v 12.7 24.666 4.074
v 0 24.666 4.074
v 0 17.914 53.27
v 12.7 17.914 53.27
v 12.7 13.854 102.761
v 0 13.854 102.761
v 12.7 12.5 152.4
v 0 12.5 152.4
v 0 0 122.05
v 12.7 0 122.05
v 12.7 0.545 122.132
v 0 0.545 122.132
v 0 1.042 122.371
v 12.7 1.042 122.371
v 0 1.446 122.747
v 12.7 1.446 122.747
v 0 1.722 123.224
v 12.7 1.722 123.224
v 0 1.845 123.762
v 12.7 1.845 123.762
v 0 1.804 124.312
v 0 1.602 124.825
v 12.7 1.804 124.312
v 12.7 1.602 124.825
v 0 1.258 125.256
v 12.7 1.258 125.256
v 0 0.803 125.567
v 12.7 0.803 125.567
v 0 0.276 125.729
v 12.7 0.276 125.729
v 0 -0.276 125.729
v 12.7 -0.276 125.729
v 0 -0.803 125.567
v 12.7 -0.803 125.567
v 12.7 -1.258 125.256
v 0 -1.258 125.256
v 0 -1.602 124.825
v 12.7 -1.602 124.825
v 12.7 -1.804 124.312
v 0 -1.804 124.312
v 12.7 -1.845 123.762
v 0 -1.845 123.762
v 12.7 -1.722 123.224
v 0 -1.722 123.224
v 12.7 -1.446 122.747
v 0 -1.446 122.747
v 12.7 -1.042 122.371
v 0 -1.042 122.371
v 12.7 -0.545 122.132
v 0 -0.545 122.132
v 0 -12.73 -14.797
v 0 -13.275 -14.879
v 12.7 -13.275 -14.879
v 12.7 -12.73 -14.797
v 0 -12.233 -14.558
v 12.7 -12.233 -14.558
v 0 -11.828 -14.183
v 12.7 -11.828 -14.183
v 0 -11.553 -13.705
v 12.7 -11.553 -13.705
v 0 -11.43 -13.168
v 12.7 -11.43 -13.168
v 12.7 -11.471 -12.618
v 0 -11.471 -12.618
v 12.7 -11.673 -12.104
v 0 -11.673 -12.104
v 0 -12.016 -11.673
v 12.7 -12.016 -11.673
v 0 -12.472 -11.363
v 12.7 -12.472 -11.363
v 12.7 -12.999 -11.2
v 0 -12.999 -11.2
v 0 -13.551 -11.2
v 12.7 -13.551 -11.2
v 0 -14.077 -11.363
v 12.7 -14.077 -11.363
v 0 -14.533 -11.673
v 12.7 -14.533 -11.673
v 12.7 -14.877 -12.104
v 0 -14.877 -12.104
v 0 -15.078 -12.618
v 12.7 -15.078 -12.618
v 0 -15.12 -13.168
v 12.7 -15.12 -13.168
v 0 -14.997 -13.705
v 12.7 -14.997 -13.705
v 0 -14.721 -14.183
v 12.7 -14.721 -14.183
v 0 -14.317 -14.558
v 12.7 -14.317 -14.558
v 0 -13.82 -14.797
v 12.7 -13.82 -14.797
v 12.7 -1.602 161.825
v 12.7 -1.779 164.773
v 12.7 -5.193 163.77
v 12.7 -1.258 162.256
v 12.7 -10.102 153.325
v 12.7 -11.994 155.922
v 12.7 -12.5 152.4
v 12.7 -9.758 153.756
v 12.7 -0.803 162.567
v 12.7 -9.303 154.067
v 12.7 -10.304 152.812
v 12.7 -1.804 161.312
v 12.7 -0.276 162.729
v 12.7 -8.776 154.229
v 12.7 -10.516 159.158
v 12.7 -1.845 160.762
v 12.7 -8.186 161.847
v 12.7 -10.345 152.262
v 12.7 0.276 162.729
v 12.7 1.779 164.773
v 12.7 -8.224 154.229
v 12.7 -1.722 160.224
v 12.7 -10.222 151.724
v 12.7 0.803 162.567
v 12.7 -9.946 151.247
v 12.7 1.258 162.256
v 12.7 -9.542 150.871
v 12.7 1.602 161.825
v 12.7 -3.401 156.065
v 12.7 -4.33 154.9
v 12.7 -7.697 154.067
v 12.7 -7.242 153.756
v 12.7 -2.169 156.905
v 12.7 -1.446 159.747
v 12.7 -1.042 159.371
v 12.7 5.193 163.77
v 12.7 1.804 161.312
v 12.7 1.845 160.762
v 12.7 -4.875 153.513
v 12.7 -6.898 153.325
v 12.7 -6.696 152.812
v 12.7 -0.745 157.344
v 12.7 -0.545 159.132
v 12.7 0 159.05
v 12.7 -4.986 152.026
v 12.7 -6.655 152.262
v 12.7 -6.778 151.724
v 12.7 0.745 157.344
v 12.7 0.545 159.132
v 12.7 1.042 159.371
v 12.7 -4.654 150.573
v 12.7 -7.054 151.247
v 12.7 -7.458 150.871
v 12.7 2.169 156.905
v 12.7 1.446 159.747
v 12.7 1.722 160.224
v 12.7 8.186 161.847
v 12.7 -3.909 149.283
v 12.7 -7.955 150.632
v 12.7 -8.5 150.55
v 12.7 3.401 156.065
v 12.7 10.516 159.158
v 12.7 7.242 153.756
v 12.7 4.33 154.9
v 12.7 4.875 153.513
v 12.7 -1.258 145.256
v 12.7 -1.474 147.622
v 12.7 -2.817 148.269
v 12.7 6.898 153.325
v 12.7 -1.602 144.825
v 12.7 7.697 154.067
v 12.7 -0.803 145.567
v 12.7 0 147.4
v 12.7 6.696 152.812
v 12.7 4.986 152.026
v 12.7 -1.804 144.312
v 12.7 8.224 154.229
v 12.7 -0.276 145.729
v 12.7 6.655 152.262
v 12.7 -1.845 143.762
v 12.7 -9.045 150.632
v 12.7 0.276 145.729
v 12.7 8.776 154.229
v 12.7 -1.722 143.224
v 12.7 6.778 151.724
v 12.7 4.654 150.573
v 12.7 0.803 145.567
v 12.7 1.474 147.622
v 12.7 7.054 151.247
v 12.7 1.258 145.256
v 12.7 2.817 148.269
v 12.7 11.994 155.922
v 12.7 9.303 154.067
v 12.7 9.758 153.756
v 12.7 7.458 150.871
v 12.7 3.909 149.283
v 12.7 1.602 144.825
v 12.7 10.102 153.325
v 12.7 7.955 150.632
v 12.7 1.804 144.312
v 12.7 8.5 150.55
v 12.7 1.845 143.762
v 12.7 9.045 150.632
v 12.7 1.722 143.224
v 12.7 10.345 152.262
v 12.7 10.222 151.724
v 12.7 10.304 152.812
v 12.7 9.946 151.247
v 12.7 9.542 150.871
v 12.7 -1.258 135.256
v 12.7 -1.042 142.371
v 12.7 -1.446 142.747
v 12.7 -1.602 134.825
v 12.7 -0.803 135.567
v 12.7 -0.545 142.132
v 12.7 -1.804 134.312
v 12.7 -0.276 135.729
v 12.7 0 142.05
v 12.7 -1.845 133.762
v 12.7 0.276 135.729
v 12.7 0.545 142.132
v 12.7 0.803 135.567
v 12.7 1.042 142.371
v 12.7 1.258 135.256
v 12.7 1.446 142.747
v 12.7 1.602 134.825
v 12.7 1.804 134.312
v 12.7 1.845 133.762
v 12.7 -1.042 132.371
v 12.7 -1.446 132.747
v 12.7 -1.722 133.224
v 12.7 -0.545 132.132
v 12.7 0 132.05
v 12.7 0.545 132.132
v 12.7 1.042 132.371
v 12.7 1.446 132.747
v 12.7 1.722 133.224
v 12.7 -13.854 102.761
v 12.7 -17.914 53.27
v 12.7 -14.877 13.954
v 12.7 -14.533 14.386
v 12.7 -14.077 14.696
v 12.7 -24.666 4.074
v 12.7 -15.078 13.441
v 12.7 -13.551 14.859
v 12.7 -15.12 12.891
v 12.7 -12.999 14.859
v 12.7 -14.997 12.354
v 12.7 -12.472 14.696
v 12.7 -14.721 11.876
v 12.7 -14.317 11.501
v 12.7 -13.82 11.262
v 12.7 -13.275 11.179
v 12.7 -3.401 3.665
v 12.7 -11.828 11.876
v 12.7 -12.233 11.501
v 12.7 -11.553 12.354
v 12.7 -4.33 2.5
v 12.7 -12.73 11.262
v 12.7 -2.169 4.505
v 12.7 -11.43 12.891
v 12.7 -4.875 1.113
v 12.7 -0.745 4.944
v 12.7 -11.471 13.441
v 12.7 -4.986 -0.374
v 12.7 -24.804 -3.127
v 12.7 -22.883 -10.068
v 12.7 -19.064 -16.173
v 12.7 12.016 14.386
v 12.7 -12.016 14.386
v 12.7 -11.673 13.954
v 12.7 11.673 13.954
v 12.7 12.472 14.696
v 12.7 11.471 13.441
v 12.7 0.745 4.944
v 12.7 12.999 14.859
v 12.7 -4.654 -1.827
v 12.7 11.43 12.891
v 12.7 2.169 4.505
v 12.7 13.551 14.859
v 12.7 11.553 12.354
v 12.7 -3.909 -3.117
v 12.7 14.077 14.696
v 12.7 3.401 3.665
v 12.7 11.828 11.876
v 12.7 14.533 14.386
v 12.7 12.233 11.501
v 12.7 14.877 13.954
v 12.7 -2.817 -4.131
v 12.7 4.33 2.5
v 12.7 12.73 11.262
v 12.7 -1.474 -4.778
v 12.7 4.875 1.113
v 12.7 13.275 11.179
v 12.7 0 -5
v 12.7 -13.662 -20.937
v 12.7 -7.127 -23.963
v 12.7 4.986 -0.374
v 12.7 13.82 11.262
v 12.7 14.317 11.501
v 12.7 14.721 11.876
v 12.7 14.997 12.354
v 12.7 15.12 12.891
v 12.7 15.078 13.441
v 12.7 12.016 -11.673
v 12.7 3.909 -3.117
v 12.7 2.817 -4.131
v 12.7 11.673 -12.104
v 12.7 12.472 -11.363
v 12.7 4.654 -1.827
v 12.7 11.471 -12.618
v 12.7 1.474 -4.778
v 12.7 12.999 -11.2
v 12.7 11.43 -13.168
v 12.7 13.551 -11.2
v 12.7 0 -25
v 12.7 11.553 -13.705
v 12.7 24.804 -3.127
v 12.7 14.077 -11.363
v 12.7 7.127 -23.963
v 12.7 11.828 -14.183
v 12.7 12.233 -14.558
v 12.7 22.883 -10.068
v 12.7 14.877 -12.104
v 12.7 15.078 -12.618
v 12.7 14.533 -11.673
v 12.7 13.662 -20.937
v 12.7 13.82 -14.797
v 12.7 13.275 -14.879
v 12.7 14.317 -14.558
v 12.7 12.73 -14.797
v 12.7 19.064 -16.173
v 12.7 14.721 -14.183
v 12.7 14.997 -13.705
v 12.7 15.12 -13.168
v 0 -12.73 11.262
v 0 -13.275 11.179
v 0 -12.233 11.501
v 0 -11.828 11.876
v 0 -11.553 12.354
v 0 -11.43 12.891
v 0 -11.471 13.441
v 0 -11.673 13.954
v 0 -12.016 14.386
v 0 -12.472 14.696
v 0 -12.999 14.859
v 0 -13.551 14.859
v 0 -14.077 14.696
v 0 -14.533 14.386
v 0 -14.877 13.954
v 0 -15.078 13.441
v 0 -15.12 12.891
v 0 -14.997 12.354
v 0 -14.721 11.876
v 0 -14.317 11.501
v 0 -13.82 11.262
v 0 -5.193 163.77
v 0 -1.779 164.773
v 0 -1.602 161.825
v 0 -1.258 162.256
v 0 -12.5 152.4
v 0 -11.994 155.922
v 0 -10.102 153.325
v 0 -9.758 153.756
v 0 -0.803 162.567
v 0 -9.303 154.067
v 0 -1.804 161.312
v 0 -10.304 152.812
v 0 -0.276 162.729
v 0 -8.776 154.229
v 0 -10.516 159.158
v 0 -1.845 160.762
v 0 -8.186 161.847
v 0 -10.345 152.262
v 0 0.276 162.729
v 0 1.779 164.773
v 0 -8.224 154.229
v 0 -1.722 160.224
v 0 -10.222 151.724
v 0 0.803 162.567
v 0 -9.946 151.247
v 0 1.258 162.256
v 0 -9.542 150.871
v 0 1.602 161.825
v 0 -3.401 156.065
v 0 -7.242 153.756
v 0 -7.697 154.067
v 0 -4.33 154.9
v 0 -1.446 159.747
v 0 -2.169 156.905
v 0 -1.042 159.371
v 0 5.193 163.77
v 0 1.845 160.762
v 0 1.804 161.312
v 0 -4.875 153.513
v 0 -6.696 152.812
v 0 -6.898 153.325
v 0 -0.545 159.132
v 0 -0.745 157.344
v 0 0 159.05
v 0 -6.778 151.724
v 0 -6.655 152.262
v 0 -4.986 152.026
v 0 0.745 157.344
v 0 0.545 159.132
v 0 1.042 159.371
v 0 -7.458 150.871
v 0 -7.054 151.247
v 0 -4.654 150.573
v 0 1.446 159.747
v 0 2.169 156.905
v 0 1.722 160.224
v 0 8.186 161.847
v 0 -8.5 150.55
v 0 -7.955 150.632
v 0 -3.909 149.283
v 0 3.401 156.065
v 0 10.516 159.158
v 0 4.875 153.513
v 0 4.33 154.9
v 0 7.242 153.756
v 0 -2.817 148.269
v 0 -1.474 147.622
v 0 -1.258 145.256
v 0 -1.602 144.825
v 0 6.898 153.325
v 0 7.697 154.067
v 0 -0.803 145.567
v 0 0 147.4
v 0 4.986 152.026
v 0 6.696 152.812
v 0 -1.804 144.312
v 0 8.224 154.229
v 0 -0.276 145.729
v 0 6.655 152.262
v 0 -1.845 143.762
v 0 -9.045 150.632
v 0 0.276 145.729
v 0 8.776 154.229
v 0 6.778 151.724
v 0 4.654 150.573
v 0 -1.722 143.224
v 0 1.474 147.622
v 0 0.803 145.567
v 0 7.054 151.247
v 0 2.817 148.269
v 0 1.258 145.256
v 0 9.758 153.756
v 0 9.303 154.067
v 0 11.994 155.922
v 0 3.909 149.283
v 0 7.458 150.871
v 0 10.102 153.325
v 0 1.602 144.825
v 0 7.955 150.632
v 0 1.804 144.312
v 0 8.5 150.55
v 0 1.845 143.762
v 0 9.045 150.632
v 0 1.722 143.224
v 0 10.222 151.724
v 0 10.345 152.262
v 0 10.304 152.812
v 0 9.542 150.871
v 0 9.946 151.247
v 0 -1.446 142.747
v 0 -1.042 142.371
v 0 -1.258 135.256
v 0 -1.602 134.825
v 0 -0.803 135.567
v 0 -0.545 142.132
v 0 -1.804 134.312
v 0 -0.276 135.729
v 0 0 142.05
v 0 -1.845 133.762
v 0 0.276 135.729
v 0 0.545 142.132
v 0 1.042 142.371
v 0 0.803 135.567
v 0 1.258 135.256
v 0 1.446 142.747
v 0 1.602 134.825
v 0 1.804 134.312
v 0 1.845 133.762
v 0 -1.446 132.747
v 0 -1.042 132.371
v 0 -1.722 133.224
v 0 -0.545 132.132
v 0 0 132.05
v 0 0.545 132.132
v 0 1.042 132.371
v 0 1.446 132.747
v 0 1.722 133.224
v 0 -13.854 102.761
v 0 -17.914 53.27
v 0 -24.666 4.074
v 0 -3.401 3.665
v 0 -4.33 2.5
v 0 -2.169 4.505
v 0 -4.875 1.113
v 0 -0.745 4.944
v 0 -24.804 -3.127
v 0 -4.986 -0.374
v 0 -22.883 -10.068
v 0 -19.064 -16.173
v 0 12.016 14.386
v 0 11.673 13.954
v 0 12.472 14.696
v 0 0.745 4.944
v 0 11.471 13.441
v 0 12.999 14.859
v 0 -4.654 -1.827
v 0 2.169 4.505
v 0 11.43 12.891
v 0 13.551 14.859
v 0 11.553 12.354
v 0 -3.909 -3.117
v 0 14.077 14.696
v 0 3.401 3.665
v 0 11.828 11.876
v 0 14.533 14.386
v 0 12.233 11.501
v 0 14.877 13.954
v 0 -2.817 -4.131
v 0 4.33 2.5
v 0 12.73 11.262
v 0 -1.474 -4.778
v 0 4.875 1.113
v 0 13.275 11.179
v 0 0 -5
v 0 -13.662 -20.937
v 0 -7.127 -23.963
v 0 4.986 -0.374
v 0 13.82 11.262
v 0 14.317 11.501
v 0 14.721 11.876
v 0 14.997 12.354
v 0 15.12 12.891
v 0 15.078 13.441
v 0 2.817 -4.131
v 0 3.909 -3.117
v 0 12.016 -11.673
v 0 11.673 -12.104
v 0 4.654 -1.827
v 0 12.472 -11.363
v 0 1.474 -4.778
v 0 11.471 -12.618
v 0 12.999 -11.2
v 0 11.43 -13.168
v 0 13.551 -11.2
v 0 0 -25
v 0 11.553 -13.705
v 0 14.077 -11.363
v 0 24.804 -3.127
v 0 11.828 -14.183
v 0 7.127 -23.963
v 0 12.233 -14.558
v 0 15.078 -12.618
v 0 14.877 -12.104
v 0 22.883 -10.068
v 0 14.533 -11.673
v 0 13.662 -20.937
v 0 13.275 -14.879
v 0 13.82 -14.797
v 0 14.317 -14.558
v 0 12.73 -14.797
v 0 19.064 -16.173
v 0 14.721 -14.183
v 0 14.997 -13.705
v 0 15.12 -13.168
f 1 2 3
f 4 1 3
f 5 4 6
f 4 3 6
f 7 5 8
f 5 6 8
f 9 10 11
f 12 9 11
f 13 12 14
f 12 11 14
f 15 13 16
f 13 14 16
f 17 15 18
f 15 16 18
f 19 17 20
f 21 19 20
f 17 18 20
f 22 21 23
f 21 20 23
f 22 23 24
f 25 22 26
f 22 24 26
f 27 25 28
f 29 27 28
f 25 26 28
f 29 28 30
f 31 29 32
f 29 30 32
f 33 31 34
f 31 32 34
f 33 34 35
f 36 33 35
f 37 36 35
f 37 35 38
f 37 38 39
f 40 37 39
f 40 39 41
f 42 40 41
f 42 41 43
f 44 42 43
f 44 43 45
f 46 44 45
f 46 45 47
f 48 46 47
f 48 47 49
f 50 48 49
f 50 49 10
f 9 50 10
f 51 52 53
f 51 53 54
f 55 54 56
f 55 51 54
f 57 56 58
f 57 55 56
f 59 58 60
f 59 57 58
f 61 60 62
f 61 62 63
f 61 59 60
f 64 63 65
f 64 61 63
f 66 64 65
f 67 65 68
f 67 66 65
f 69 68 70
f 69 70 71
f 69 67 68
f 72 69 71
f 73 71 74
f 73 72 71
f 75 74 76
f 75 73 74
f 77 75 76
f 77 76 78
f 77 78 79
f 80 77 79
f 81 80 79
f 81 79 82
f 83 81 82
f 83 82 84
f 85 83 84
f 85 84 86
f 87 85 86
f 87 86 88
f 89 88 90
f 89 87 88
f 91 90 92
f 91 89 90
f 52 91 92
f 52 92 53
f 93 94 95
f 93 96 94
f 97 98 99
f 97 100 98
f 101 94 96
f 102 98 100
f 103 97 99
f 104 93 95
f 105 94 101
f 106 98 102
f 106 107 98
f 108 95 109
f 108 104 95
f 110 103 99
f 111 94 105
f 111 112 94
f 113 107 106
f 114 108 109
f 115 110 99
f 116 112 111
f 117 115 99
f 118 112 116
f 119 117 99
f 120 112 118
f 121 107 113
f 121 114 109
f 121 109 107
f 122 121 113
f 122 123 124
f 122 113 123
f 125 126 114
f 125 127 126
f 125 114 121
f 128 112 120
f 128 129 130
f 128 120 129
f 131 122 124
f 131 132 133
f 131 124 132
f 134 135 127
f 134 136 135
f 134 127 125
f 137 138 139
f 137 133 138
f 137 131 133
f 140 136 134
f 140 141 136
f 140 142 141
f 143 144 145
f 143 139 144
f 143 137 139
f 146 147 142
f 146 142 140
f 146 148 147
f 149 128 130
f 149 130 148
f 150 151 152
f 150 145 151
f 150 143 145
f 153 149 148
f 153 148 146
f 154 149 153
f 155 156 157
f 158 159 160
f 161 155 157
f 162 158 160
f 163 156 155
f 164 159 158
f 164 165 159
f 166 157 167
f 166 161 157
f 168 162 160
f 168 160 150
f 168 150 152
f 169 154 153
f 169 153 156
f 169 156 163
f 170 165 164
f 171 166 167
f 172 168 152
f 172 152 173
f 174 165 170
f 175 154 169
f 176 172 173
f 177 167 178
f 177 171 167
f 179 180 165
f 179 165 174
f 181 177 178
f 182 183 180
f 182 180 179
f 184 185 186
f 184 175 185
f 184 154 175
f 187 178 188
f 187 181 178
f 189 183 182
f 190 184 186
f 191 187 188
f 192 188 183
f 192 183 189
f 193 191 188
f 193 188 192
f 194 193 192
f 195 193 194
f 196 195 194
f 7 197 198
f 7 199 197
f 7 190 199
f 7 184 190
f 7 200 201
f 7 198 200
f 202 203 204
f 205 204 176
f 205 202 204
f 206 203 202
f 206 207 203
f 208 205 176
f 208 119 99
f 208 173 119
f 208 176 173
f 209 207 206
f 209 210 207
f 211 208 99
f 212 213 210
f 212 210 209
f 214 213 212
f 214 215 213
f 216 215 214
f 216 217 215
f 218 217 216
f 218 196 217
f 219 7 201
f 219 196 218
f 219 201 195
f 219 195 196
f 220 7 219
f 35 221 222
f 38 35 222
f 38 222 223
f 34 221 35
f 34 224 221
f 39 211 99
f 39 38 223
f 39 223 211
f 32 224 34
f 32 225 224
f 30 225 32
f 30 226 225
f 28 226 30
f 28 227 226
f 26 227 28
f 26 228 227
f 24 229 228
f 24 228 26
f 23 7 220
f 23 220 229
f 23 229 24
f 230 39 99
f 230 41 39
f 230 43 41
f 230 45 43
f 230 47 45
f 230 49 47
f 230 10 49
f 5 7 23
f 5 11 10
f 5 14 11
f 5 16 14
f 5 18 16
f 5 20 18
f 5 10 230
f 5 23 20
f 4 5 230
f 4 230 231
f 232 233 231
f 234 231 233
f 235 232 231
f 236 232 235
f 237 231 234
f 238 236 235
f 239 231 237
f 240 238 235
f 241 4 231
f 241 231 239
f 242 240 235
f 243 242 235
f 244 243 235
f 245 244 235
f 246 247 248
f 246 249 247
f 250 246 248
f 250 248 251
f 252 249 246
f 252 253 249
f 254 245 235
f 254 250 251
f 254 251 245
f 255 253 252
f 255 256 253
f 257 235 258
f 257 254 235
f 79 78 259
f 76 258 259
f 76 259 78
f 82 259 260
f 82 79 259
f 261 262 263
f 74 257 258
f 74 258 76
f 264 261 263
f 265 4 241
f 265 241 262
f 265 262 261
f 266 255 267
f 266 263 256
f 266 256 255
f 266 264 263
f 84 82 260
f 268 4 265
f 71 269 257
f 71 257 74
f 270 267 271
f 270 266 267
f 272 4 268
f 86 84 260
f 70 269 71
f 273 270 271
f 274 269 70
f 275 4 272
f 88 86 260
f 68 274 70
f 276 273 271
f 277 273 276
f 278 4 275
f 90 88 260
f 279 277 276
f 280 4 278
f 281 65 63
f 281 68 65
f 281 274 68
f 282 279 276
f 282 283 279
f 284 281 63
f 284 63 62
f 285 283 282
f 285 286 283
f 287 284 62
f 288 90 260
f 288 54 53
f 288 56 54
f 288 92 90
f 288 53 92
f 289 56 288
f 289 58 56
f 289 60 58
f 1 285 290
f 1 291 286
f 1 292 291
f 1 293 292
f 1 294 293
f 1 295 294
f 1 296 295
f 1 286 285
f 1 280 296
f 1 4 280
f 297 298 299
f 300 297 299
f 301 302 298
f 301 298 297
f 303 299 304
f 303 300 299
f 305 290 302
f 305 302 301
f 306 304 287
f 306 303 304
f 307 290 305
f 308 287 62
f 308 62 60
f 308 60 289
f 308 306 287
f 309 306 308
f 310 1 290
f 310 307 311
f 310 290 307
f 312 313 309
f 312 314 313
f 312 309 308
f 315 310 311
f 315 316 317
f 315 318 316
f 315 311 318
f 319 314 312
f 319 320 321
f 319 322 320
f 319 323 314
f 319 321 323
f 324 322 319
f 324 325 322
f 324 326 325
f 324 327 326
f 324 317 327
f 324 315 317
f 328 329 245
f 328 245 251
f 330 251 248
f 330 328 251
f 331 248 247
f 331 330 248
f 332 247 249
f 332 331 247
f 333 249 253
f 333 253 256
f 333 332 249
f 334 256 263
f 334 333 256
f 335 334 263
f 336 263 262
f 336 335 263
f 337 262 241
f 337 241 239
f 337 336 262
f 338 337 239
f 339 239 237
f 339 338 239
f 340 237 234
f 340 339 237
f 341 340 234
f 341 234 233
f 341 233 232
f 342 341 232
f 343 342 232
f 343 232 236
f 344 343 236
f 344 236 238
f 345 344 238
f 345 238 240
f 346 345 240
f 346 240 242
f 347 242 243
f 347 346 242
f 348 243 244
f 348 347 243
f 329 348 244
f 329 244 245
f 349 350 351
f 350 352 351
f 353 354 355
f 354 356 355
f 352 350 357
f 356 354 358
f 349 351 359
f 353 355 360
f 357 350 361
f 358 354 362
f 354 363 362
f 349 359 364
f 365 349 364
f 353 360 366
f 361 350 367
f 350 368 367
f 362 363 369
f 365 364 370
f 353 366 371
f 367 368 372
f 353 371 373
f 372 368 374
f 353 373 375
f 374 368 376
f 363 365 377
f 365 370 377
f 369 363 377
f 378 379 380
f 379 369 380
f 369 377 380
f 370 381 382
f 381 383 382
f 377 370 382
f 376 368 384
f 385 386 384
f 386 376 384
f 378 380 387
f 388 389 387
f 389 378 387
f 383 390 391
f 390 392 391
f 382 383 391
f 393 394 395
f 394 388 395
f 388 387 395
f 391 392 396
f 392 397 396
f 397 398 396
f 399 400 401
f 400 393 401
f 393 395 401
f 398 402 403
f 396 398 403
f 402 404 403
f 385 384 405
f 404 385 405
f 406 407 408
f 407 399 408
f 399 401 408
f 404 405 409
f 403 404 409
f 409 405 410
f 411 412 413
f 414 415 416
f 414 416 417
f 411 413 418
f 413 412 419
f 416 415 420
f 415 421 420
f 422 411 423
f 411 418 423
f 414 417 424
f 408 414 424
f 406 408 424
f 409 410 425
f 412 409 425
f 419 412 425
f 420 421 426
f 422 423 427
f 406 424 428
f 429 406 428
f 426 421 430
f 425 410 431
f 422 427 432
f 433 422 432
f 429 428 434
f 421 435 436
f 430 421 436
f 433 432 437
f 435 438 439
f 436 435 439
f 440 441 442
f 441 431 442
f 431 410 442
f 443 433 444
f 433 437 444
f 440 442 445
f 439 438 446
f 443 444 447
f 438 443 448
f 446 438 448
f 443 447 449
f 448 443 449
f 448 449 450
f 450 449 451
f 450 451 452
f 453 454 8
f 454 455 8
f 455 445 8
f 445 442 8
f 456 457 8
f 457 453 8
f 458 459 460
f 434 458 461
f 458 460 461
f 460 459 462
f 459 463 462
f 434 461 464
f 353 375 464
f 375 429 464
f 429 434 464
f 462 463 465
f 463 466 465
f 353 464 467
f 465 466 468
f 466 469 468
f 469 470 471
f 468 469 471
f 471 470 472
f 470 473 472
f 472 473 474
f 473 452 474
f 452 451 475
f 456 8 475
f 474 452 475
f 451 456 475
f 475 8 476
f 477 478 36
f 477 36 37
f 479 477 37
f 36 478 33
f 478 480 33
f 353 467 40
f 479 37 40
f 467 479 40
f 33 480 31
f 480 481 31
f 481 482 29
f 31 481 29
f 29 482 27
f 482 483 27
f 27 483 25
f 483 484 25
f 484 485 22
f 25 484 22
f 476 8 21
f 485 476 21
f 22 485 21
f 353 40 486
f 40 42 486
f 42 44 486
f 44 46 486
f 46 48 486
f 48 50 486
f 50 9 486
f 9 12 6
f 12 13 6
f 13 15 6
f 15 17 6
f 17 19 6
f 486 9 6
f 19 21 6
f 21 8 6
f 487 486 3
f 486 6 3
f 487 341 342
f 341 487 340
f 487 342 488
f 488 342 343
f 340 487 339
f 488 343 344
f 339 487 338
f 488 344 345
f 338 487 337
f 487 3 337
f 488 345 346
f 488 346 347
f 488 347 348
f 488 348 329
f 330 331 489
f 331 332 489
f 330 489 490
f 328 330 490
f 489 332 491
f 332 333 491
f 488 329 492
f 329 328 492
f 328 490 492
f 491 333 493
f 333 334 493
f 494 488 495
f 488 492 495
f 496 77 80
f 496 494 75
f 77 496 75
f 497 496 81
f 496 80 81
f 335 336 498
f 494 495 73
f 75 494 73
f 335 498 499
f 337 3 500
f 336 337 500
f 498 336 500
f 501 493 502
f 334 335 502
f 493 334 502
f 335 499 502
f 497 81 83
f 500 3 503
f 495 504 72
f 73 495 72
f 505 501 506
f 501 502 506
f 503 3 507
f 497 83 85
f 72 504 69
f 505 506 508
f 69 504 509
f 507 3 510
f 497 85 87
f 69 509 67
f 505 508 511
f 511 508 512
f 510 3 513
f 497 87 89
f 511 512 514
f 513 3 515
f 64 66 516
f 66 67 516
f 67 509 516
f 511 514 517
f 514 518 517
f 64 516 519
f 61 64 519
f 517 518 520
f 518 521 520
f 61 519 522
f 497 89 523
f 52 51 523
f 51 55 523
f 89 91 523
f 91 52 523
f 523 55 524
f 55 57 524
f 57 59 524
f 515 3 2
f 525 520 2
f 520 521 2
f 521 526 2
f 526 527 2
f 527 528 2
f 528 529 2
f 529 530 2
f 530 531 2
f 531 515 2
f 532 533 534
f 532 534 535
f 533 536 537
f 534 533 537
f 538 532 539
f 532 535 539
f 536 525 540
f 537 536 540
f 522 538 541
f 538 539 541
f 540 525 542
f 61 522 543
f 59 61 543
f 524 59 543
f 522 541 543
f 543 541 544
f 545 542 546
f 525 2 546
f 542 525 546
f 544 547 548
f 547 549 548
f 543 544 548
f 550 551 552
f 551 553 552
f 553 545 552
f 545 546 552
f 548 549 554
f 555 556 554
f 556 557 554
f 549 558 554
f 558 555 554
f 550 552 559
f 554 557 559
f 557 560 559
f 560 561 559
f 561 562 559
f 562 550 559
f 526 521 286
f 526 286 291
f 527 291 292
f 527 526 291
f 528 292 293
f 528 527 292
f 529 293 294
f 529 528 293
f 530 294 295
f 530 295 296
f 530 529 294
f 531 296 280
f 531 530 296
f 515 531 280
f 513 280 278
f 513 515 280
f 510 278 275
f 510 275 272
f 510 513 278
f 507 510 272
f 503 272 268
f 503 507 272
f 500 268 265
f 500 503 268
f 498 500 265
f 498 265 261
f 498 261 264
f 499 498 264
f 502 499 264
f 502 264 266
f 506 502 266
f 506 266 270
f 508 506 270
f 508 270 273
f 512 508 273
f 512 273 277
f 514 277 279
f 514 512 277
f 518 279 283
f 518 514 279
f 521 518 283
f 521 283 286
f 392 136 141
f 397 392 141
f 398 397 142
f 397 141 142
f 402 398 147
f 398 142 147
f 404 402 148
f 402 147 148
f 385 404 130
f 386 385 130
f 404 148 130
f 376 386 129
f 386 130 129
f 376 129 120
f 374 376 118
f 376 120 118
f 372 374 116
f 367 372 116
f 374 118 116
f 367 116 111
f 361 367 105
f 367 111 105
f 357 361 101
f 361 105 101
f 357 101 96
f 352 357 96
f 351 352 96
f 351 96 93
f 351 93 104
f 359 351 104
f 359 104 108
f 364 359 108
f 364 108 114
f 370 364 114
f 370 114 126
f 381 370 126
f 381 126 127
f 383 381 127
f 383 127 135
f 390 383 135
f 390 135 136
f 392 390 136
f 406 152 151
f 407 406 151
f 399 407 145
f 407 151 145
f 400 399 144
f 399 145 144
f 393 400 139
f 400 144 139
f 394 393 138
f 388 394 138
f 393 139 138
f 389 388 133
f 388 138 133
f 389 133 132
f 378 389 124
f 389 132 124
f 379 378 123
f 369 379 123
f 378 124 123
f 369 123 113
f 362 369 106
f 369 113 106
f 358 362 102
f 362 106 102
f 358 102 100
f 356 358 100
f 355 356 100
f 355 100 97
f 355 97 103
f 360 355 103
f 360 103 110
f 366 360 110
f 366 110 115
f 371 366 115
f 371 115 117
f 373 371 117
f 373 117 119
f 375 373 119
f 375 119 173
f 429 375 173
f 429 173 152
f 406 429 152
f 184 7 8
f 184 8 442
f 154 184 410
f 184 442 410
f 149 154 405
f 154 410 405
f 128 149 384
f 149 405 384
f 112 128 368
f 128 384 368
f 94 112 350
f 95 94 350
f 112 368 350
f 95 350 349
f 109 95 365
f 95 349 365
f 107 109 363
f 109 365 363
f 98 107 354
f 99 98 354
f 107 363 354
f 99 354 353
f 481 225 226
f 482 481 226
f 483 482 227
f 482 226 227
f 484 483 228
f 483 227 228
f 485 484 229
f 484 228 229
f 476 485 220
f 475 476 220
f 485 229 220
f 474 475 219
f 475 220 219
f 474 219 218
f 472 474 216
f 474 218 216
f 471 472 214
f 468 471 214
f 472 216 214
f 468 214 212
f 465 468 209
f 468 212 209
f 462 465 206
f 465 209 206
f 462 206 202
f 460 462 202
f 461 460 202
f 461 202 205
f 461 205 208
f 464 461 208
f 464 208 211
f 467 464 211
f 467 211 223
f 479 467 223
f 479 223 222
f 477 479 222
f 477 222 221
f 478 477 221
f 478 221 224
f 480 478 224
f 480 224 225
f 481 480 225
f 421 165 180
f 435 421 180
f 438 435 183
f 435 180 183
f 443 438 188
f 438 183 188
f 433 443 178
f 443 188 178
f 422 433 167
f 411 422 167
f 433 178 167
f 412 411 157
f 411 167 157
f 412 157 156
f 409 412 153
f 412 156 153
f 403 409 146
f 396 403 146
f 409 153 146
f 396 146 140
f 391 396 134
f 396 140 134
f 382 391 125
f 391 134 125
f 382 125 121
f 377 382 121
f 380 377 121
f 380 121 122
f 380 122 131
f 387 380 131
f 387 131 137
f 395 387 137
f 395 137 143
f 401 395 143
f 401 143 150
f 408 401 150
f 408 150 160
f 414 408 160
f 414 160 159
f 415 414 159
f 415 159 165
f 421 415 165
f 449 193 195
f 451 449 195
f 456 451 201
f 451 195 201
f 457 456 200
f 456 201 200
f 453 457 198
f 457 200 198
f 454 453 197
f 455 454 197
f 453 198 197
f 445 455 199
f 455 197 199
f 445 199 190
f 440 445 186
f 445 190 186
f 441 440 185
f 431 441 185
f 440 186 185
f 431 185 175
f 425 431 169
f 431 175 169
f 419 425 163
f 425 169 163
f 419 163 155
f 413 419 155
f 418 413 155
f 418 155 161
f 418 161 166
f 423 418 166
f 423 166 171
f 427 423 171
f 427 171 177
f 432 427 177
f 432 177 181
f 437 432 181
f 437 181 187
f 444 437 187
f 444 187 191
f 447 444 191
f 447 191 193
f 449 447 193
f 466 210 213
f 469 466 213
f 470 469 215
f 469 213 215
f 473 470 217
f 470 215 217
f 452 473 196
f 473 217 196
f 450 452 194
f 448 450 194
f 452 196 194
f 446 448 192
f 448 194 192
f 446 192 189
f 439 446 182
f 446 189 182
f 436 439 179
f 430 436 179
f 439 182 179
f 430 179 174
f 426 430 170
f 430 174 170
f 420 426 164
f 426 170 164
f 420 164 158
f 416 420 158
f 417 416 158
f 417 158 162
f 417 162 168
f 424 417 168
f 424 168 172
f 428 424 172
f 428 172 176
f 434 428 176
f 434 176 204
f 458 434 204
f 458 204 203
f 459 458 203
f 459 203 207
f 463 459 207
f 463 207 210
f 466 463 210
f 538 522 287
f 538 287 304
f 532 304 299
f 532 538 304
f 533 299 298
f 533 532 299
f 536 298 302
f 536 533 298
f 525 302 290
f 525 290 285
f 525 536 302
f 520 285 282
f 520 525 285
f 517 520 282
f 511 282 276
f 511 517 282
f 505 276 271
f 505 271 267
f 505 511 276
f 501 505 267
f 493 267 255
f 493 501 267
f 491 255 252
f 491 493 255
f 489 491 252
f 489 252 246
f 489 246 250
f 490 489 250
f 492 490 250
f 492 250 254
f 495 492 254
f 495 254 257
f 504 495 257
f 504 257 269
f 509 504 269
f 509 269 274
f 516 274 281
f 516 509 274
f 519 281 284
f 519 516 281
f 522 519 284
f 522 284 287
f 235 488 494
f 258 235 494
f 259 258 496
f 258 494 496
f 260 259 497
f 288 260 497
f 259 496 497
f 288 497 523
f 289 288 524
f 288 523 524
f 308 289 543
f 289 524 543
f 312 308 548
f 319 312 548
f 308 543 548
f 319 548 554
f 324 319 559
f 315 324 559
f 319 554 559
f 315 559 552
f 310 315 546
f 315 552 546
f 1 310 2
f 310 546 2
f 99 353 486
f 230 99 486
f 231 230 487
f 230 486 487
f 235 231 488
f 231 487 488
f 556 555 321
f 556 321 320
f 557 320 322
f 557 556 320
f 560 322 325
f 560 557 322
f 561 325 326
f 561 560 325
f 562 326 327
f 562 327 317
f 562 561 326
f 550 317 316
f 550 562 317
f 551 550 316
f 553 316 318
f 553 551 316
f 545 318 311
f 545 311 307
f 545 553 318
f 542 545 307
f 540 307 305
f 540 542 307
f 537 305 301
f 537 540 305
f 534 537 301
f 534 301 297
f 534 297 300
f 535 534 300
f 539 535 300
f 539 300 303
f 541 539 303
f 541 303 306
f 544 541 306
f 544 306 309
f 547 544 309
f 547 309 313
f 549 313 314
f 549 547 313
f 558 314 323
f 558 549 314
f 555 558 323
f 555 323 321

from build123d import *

# Parameters (mm, degrees)
BOSS_EXTRUDE1_DEPTH      = 12.7
CUT_EXTRUDE1_START       = -12.7
CUT_EXTRUDE1_OUTLINE_R   = 5
CUT_EXTRUDE1_OUTLINE_R_2 = 1.85
CUT_EXTRUDE1_DEPTH       = 12.7
SKETCH5_R                = 5
SKETCH5_R_2              = 1.85
CUT_EXTRUDE2_DEPTH       = 168.267151587


# Read off the part's stored shape, not the designer's step: Cut-Extrude1
with BuildPart() as part:
    # Sketch1 → Boss-Extrude1 (new body)
    with BuildSketch(Plane(origin=(0, 0, 0), x_dir=(0, 0, -1), z_dir=(1, 0, 0))):
        with BuildLine():
            ThreePointArc((-4.073644652, -24.665875603), (25, 0), (-4.073644652, 24.665875603))
            ThreePointArc((-4.073644652, 24.665875603), (-77.987776172, 15.546567094), (-152.4, 12.5))
            ThreePointArc((-152.4, 12.5), (-164.9, 0), (-152.4, -12.5))
            ThreePointArc((-152.4, -12.5), (-77.987776172, -15.546567094), (-4.073644652, -24.665875603))
        make_face()
    extrude(amount=BOSS_EXTRUDE1_DEPTH)

    # Cut-Extrude1 outline → Cut-Extrude1 (cut)
    with BuildSketch(Plane(origin=(12.7, 0, 0), x_dir=(0, 0, -1), z_dir=(1, 0, 0)).offset(CUT_EXTRUDE1_START)):
        Circle(CUT_EXTRUDE1_OUTLINE_R)
        with Locations((13.029498672, 13.274798425)):
            Circle(CUT_EXTRUDE1_OUTLINE_R_2)
        with Locations((13.029498672, -13.274798425)):
            Circle(CUT_EXTRUDE1_OUTLINE_R_2)
        with Locations((-13.029498672, -13.274798425)):
            Circle(CUT_EXTRUDE1_OUTLINE_R_2)
        with Locations((-13.029498672, 13.274798425)):
            Circle(CUT_EXTRUDE1_OUTLINE_R_2)
    extrude(amount=CUT_EXTRUDE1_DEPTH, mode=Mode.SUBTRACT)

    # Sketch5 → Cut-Extrude2 (cut, through all)
    with BuildSketch(Plane(origin=(12.7, 0, 0), x_dir=(0, 0, -1), z_dir=(1, 0, 0))):
        with Locations((-152.4, 0)):
            Circle(SKETCH5_R)
        with Locations((-143.9, 0)):
            Circle(SKETCH5_R_2)
        with Locations((-152.4, -8.5)):
            Circle(SKETCH5_R_2)
        with Locations((-160.9, 0)):
            Circle(SKETCH5_R_2)
        with Locations((-152.4, 8.5)):
            Circle(SKETCH5_R_2)
        with Locations((-133.9, 0)):
            Circle(SKETCH5_R_2)
        with Locations((-123.9, 0)):
            Circle(SKETCH5_R_2)
    extrude(amount=-CUT_EXTRUDE2_DEPTH, mode=Mode.SUBTRACT)


solid = part.part
